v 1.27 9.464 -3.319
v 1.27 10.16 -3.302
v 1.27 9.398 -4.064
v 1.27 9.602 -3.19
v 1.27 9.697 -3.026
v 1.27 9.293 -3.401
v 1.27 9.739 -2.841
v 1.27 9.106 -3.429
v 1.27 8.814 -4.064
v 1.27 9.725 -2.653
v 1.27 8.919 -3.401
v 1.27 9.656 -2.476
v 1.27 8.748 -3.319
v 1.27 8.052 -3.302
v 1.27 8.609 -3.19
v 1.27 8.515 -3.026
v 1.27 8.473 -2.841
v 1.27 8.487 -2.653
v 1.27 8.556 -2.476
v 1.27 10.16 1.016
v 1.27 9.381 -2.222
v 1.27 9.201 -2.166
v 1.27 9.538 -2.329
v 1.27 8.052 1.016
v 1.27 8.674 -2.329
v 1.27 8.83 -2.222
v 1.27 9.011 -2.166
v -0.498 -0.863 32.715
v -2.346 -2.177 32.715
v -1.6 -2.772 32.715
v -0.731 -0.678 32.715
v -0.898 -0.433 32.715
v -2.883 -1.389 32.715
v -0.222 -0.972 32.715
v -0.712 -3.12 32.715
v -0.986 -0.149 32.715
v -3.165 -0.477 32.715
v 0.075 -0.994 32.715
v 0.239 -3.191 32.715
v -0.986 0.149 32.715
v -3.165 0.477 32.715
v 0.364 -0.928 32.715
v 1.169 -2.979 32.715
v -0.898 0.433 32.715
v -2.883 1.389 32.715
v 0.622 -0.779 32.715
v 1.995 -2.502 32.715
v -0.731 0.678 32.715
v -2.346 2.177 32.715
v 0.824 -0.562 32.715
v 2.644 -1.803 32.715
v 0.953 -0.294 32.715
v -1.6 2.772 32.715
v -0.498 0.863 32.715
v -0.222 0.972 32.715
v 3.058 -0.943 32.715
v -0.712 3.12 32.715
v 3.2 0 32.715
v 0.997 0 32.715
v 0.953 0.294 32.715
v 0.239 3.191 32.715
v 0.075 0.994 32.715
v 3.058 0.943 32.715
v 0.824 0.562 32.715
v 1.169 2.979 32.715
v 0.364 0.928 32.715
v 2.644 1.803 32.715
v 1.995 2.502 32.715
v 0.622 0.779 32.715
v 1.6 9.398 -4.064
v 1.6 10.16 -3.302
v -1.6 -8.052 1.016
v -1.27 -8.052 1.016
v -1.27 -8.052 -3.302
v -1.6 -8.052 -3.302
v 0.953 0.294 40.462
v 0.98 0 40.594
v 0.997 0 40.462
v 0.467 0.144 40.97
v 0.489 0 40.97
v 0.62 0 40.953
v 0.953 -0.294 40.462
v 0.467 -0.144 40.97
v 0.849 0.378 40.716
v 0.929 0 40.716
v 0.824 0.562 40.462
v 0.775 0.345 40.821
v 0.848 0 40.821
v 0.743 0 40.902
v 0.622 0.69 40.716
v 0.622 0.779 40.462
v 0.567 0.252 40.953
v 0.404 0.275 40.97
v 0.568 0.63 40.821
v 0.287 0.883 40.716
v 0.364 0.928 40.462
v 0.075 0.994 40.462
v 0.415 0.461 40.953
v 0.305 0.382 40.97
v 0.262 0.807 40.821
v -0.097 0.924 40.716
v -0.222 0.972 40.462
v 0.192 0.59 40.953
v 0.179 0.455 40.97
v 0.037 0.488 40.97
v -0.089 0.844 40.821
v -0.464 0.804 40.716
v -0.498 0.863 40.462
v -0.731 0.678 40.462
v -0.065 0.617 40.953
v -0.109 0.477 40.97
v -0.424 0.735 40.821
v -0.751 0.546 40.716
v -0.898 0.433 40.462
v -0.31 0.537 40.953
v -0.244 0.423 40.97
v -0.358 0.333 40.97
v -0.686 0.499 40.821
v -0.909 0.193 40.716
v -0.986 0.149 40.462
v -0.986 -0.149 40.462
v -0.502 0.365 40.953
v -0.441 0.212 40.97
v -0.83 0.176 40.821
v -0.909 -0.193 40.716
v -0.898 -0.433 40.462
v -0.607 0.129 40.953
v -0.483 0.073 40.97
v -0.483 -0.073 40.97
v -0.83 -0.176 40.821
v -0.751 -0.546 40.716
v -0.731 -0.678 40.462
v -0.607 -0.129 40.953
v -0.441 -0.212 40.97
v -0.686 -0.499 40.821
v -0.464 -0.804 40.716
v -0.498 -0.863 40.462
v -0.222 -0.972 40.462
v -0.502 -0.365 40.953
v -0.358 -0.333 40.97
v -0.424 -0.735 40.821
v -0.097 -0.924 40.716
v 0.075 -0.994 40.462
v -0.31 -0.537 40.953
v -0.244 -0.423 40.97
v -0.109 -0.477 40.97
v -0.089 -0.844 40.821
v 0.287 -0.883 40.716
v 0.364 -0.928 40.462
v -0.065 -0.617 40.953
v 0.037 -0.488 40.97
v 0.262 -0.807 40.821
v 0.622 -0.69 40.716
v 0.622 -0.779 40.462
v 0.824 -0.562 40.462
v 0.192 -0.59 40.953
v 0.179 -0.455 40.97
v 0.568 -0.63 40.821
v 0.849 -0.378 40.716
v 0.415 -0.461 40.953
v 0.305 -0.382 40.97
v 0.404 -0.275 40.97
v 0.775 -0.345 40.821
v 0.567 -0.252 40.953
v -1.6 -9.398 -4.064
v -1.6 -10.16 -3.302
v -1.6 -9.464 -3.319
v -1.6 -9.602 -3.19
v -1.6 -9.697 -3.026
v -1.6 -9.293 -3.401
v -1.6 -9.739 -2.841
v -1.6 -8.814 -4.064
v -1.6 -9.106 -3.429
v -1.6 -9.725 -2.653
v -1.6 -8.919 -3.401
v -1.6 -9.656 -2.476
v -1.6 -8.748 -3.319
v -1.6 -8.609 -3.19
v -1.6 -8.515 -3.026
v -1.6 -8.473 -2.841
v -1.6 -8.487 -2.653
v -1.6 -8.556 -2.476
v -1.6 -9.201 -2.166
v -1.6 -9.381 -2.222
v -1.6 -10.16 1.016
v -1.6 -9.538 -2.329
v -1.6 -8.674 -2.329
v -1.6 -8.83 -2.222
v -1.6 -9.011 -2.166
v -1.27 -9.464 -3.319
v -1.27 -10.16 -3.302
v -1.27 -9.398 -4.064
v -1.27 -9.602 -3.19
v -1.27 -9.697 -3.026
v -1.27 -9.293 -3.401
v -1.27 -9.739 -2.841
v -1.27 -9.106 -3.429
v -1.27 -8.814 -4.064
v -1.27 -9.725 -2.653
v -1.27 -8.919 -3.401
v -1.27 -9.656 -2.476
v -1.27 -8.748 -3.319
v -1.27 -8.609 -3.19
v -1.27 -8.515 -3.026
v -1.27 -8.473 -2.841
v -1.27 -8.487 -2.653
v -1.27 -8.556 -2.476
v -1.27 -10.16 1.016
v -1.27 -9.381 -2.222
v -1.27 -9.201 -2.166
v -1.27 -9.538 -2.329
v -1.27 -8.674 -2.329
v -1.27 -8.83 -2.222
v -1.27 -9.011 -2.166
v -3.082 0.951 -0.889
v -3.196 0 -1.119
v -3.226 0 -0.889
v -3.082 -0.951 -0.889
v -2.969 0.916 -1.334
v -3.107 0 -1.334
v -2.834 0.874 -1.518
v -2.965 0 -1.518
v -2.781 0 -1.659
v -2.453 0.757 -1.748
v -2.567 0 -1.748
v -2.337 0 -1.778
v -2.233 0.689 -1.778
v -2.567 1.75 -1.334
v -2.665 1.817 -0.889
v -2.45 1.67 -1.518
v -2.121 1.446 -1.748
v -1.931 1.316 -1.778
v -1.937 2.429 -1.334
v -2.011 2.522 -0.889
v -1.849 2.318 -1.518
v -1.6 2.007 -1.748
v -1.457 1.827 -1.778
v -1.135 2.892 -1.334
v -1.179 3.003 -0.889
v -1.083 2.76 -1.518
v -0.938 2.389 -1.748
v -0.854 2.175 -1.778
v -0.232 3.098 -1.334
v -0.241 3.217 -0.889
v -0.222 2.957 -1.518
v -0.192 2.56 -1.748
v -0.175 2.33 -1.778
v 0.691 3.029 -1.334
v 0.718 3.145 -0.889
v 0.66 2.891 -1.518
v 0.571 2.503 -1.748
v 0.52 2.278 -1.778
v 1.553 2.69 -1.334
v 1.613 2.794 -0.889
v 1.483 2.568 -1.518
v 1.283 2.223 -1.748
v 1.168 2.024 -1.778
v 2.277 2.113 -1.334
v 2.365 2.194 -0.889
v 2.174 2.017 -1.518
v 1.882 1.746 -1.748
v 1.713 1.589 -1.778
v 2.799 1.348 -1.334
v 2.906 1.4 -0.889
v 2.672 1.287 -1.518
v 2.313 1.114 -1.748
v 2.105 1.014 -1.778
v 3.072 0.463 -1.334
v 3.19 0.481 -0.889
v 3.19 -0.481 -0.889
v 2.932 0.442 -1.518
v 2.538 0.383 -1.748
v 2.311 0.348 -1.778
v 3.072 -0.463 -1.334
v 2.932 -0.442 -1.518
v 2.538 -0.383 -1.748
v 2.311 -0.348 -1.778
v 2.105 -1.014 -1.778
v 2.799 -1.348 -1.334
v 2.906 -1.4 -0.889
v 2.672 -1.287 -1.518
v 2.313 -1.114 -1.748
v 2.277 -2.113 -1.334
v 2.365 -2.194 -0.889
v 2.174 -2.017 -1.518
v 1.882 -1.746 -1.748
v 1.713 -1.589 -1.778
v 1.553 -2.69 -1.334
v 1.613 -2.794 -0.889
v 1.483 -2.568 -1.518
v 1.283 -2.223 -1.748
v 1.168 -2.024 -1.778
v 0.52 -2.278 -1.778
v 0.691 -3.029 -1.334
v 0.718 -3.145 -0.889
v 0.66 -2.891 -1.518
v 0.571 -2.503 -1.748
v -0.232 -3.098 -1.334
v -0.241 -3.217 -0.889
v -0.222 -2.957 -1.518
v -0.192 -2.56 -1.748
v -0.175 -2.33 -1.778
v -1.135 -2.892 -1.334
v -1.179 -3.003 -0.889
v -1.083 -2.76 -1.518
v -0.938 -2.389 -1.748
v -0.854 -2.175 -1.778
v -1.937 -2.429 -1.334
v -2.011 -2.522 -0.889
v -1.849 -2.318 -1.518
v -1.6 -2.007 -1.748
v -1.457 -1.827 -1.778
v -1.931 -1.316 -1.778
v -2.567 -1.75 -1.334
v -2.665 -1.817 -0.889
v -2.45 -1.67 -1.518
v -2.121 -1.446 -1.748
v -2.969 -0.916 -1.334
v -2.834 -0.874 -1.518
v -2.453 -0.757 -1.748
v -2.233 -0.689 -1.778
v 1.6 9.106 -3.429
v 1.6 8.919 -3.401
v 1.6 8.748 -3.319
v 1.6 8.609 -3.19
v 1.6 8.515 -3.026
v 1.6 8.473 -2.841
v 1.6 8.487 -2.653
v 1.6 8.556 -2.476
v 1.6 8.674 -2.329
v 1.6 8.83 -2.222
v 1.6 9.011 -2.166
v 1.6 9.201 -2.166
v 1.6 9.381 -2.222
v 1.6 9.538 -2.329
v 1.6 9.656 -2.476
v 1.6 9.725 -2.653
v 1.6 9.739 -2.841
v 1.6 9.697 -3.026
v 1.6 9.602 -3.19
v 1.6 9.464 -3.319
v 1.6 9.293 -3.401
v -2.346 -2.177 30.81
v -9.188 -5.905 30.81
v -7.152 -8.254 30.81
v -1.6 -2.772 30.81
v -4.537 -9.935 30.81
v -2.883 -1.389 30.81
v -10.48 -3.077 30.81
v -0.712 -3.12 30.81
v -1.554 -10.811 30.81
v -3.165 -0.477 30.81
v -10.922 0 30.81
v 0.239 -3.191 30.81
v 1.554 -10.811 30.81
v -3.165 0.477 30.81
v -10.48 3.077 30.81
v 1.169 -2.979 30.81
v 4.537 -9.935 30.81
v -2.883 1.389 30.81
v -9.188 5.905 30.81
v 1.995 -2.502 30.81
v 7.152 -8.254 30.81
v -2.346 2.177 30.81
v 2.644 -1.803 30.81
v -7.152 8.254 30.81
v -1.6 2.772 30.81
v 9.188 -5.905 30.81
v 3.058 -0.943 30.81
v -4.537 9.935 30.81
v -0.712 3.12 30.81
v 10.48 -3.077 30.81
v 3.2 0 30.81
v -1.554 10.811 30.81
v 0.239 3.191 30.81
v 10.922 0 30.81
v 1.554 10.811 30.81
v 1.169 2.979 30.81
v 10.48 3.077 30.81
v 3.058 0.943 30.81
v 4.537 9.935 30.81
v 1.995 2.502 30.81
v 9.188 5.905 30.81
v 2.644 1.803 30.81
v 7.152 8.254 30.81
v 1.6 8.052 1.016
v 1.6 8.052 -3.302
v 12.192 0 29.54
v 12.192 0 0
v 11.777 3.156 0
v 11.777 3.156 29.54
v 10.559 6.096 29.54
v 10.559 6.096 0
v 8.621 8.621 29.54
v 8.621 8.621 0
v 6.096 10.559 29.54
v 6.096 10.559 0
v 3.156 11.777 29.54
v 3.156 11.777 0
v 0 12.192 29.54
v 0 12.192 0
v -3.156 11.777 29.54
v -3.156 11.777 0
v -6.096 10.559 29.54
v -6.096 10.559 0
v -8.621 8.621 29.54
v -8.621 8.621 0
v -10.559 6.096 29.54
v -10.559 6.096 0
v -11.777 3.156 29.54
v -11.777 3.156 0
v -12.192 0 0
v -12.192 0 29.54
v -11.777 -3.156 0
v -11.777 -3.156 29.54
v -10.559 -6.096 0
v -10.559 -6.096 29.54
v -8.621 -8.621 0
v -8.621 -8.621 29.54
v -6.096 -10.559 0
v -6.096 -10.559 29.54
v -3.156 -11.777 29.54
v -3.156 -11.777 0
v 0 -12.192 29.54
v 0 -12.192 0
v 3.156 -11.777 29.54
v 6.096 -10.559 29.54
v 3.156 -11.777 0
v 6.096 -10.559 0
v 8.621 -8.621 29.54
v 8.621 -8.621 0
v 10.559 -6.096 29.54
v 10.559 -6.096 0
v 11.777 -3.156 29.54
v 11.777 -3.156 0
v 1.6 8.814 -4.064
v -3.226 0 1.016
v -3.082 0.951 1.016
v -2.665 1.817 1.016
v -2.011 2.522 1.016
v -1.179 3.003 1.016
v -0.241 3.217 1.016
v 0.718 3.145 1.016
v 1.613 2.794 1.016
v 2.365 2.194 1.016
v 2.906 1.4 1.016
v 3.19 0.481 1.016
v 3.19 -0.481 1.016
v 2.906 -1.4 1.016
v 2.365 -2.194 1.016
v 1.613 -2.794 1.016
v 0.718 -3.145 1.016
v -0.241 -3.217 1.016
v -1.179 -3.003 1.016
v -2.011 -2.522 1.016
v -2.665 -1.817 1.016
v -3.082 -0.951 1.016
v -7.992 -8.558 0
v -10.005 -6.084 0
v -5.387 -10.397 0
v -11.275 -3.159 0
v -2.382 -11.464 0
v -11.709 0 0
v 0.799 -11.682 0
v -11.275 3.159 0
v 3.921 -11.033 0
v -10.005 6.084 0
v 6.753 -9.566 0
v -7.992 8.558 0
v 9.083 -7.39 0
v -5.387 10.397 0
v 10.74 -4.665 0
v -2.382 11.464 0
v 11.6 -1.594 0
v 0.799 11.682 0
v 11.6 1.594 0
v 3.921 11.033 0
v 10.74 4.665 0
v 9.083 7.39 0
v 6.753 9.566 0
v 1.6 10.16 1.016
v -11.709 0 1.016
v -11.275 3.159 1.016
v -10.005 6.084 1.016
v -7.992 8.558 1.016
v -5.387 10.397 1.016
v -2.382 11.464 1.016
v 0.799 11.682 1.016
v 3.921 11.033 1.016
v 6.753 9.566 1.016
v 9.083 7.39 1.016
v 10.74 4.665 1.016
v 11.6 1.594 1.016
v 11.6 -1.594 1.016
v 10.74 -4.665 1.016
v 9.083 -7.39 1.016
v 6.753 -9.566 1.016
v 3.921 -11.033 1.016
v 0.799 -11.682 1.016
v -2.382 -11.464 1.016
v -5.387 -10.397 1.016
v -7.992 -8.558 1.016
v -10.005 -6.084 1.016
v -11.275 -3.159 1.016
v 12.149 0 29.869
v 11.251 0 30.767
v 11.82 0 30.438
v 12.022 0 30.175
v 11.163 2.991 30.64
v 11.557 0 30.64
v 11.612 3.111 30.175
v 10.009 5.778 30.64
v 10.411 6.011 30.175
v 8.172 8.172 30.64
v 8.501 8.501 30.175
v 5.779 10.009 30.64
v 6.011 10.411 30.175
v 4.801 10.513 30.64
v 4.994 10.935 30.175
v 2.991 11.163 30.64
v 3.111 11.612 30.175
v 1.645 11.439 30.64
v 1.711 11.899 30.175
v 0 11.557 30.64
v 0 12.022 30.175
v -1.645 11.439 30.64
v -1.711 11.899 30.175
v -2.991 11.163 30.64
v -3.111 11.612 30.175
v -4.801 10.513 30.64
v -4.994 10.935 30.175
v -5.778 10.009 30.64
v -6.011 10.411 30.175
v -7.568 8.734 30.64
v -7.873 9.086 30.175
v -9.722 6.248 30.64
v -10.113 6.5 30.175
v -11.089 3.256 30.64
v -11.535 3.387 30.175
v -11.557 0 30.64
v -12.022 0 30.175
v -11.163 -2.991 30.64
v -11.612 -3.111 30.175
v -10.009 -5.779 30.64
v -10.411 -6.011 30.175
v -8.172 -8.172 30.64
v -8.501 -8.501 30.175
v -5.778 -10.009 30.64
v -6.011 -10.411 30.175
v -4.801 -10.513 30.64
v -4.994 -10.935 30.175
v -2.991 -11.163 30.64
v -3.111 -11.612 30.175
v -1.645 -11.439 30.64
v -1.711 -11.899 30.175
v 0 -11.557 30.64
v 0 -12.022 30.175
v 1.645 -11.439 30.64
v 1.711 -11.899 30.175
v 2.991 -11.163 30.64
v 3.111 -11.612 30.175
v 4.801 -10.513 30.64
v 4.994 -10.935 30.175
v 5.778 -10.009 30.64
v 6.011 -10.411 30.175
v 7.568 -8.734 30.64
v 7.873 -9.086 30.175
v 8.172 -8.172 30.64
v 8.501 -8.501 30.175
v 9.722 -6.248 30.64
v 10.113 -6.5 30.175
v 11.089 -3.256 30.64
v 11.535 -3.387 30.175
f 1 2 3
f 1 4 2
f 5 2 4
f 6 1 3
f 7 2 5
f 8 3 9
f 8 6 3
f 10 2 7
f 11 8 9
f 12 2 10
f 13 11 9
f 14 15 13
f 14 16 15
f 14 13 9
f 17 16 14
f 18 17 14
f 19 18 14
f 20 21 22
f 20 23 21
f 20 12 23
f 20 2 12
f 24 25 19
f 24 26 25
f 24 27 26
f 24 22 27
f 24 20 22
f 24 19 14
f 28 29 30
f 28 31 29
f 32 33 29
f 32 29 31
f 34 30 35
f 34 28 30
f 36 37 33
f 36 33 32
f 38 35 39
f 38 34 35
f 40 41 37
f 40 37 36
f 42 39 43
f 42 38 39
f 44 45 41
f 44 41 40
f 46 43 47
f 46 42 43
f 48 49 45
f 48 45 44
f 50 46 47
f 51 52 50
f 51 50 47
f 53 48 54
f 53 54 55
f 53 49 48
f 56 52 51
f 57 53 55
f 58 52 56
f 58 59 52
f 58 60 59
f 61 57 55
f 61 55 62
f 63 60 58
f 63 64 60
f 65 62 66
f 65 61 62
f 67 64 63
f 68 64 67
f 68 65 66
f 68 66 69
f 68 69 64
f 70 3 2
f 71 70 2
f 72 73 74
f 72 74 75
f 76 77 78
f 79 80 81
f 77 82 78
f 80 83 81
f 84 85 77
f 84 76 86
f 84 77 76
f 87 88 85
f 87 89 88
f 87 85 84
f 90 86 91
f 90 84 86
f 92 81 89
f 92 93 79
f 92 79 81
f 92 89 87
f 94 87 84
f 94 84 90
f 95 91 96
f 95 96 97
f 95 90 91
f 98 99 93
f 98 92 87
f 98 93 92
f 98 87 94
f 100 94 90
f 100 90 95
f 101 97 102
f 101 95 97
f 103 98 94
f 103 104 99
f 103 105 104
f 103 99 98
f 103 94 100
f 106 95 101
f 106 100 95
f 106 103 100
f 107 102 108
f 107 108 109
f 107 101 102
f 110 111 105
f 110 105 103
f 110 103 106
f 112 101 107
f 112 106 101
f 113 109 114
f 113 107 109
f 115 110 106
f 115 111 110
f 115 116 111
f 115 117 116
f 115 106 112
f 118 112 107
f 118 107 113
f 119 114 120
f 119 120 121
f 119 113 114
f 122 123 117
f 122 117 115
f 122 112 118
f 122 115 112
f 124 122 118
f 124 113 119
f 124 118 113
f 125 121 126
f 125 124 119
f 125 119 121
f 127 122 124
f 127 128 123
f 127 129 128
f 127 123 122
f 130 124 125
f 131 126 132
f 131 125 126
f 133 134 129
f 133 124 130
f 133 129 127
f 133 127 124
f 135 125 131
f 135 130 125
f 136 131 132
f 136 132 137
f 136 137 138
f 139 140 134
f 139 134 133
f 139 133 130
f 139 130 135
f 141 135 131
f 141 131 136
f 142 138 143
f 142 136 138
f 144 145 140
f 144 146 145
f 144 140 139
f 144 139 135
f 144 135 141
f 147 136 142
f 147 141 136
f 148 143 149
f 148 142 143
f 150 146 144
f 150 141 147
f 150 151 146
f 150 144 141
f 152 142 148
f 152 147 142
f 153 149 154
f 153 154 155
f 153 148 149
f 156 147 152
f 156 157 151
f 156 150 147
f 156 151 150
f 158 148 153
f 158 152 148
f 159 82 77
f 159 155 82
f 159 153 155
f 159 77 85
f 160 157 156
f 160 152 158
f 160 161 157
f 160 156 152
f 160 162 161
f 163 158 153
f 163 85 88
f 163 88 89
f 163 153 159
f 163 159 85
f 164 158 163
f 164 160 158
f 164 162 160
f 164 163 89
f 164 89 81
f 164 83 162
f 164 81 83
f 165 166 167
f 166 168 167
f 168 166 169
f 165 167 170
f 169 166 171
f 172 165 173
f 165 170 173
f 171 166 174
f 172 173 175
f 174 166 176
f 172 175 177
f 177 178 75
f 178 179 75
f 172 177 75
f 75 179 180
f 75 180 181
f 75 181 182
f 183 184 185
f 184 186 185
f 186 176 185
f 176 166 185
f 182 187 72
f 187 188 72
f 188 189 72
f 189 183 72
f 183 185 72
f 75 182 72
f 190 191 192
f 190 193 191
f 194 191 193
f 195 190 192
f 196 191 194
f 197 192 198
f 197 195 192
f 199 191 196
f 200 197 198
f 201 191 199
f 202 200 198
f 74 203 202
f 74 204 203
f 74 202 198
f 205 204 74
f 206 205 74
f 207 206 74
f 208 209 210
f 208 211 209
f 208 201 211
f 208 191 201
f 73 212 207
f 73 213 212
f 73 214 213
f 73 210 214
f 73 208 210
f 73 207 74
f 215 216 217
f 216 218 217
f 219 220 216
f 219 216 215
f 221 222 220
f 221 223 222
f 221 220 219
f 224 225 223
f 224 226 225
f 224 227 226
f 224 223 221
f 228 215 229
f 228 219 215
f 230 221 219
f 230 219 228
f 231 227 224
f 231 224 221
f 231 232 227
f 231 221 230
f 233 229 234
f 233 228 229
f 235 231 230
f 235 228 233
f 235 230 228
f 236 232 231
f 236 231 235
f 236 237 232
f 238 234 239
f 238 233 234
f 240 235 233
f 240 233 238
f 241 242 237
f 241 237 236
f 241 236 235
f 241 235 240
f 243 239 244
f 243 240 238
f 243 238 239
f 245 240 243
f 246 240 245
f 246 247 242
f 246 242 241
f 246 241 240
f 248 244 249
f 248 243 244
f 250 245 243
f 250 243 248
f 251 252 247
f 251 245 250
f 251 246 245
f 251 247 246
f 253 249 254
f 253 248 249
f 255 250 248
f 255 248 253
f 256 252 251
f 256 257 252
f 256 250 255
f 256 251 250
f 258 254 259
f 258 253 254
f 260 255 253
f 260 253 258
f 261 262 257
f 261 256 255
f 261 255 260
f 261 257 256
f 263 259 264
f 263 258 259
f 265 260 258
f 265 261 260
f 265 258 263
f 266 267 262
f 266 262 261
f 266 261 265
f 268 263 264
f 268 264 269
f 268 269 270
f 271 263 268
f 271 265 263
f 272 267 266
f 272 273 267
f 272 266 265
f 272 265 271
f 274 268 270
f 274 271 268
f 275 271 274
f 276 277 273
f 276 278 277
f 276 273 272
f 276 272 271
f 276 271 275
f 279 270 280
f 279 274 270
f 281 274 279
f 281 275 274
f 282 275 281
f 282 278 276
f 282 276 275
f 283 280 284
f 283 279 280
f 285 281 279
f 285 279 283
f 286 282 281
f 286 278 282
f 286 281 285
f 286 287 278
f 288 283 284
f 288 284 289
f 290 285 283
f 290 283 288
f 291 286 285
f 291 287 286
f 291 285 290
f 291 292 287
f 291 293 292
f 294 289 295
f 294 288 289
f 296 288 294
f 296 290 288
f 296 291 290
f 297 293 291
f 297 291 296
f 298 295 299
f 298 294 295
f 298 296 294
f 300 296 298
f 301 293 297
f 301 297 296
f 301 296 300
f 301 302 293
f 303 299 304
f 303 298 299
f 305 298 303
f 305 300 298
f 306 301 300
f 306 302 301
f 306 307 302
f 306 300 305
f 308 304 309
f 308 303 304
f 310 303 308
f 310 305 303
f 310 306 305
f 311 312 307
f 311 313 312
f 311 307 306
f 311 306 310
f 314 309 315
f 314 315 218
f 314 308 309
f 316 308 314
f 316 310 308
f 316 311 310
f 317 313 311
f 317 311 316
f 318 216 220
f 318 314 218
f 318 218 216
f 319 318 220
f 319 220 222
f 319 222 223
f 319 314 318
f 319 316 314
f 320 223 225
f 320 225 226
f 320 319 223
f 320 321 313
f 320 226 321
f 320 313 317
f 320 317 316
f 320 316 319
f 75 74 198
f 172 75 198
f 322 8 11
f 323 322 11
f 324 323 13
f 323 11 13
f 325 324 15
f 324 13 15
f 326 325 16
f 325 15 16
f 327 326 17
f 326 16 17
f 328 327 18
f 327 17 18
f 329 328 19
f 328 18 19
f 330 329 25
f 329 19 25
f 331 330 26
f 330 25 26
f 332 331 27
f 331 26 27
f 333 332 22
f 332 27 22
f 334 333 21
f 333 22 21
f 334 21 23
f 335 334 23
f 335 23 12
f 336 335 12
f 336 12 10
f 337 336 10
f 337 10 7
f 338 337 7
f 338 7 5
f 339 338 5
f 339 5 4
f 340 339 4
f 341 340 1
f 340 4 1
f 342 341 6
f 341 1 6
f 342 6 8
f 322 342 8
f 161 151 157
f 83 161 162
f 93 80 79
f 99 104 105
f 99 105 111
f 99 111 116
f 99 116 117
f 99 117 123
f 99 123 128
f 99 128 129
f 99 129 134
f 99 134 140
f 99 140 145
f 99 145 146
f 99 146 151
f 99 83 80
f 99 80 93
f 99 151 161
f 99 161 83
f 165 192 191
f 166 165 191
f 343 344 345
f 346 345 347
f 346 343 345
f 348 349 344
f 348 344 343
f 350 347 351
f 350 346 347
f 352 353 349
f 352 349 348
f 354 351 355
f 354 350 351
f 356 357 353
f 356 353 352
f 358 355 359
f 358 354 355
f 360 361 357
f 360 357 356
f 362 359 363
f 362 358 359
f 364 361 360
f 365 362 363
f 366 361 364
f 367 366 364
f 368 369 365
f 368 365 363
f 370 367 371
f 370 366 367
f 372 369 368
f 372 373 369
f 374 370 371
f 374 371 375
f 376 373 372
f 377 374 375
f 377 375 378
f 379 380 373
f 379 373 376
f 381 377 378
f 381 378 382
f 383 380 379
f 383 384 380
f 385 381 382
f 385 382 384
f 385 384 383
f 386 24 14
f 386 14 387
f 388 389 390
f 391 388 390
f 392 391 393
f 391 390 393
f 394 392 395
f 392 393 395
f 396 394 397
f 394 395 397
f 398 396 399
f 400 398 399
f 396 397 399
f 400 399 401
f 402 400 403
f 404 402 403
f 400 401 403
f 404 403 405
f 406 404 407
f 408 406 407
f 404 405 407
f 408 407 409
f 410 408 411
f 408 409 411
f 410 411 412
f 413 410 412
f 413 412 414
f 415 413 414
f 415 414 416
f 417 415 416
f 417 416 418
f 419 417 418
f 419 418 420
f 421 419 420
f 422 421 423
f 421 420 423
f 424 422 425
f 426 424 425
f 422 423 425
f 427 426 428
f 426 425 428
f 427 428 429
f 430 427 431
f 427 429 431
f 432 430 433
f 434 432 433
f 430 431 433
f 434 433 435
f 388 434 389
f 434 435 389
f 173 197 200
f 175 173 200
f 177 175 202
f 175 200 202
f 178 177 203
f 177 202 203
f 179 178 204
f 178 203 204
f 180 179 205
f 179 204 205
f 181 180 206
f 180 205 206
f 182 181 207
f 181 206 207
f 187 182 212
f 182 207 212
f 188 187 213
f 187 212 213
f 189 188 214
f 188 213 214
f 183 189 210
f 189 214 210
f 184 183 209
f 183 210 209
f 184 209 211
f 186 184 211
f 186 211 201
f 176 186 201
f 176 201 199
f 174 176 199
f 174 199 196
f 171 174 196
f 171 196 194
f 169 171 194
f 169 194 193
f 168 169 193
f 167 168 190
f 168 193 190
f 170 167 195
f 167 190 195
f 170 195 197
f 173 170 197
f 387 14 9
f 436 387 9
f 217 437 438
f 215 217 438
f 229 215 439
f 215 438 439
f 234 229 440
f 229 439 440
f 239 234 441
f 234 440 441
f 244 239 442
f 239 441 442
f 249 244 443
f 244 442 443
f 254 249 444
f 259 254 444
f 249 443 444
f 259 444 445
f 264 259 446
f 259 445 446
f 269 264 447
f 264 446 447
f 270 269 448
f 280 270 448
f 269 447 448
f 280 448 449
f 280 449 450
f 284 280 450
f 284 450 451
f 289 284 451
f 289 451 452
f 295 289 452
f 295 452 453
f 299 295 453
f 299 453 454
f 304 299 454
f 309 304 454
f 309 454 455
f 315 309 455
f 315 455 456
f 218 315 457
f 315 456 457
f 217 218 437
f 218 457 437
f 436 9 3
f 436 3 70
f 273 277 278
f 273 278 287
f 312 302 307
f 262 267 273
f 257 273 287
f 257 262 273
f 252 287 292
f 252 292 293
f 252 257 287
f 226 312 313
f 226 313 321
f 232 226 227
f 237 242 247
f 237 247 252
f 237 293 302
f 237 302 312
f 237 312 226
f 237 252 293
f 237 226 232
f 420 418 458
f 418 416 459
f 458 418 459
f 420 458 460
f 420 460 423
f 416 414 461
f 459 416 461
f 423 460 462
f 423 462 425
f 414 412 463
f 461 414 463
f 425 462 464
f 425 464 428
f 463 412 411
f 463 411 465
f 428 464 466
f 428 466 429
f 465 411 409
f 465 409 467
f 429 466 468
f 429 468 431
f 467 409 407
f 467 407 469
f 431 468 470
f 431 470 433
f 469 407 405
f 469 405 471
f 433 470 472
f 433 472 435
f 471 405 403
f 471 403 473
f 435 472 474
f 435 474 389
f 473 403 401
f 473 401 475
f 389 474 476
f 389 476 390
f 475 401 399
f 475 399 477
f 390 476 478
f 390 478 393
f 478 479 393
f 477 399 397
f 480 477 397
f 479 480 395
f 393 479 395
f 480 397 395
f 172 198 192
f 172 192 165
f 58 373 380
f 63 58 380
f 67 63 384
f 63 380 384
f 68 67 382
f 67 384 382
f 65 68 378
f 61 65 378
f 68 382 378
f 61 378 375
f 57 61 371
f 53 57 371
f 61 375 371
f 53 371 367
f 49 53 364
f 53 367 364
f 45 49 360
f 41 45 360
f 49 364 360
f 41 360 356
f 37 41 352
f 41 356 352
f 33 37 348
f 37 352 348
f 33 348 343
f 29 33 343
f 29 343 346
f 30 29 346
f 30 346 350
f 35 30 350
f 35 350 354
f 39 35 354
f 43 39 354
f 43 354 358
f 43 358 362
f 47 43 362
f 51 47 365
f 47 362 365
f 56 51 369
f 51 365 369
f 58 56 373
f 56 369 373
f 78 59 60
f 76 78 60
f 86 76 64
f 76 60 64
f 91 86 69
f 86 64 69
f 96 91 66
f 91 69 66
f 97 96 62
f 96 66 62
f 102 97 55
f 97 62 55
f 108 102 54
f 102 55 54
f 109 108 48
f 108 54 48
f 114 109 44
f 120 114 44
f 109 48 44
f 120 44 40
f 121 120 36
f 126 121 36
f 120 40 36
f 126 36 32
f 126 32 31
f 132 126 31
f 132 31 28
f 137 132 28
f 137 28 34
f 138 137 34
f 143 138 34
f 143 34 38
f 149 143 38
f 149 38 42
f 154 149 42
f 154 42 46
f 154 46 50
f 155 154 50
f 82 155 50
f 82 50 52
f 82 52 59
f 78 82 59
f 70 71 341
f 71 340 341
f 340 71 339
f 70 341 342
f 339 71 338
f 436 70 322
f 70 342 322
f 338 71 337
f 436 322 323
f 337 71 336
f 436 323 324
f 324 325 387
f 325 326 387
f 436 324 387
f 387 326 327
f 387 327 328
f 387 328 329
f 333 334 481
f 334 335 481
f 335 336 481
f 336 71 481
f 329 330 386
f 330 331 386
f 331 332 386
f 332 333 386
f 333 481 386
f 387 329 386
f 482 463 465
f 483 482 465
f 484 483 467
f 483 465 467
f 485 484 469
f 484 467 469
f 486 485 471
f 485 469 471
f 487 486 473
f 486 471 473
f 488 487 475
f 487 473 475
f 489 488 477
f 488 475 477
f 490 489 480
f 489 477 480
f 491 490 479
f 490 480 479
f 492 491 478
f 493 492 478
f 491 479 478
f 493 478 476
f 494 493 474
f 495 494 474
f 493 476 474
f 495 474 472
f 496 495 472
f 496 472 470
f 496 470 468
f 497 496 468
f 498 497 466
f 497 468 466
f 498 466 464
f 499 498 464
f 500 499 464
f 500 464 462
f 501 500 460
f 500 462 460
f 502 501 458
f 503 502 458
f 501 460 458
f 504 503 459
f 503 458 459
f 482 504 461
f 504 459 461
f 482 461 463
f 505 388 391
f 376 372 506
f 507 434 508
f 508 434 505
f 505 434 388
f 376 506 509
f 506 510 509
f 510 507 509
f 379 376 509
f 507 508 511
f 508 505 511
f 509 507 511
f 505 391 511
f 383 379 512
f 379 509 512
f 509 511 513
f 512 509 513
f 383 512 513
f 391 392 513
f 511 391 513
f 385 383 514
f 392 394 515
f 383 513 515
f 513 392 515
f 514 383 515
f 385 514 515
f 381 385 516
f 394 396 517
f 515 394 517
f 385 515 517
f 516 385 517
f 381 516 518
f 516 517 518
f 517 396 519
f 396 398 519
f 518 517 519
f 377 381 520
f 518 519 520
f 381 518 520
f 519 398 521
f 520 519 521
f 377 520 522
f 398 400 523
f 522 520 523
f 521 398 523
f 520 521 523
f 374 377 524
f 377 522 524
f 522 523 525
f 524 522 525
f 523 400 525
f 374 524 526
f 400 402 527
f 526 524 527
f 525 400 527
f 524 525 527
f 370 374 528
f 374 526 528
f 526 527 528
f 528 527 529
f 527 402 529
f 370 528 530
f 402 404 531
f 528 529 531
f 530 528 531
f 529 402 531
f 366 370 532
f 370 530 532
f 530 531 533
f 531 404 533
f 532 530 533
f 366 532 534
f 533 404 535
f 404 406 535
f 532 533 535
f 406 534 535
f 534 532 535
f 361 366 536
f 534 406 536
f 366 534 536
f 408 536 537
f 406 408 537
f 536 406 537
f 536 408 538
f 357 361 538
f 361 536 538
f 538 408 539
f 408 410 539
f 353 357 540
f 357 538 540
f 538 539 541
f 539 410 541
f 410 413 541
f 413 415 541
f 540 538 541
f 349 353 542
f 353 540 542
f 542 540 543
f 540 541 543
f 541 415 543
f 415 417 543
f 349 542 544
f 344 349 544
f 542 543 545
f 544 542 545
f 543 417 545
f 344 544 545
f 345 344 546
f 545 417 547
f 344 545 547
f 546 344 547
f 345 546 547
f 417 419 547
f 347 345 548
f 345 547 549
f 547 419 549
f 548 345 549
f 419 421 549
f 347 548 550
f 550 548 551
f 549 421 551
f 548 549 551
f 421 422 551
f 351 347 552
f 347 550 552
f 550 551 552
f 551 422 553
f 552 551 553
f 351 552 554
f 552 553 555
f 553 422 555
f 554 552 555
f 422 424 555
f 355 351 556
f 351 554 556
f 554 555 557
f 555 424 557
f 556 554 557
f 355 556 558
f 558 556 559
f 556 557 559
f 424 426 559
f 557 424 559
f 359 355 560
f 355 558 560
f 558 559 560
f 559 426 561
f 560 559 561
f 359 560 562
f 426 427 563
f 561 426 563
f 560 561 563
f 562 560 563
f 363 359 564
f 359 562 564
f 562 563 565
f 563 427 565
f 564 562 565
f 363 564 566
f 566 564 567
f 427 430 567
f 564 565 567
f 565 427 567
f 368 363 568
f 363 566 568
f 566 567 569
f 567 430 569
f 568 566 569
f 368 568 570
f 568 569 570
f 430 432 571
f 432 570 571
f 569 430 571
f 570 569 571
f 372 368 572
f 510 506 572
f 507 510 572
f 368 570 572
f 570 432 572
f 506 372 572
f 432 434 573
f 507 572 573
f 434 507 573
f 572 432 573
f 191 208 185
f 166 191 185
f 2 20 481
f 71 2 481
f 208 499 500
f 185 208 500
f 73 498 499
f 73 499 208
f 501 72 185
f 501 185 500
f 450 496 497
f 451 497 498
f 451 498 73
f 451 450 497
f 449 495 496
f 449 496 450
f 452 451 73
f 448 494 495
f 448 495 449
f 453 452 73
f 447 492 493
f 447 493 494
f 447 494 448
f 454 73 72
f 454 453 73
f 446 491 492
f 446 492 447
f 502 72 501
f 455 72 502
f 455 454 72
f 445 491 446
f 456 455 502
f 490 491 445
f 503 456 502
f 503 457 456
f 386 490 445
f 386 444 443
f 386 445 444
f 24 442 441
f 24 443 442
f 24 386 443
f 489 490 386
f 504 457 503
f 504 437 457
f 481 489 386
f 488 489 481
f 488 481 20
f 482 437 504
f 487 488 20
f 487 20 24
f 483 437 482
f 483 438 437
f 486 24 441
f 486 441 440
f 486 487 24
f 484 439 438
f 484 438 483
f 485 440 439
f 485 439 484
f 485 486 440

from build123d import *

# Parameters (mm, degrees)
SKETCH1_R           = 12.192
BOSS_EXTRUDE1_DEPTH = 30.8102
SKETCH2_R           = 0.99695
BOSS_EXTRUDE3_DEPTH = 10.16
SKETCH6_R           = 3.2004
BOSS_EXTRUDE4_DEPTH = 1.905
FILLET2_R           = 0.508
FILLET3_R           = 1.27
SKETCH7_R           = 11.7094
CUT_EXTRUDE1_DEPTH  = 1.016
SKETCH10_R          = 3.2258
BOSS_EXTRUDE5_DEPTH = 2.794
FILLET4_R           = 0.889
SKETCH11_W          = 0.3302
SKETCH11_H          = 2.1082
BOSS_EXTRUDE6_DEPTH = 5.08
SKETCH12_R          = 0.635
CUT_EXTRUDE2_DEPTH  = 0.3302
CIRPATTERN1_COUNT   = 2


with BuildPart() as part:
    # Sketch1 → Boss-Extrude1 (new body)
    with BuildSketch(Plane.XY):
        Circle(SKETCH1_R)
    extrude(amount=BOSS_EXTRUDE1_DEPTH)

    # Sketch2 → Boss-Extrude3 (add)
    with BuildSketch(Plane.XY.offset(30.8102)):
        Circle(SKETCH2_R)
    extrude(amount=BOSS_EXTRUDE3_DEPTH)

    # Sketch6 → Boss-Extrude4 (add)
    with BuildSketch(Plane.XY.offset(30.8102)):
        Circle(SKETCH6_R)
    extrude(amount=BOSS_EXTRUDE4_DEPTH)

    # Fillet2
    fillet2_edges = [part.edges().sort_by_distance(p)[0] for p in [
        (-0.99695, 0, 40.9702),
    ]]
    fillet(fillet2_edges, radius=FILLET2_R)

    # Fillet3
    fillet3_edges = [part.edges().sort_by_distance(p)[0] for p in [
        (-12.192, 0, 30.8102),
    ]]
    fillet(fillet3_edges, radius=FILLET3_R)

    # Sketch7 → Cut-Extrude1 (cut)
    with BuildSketch(Plane(origin=(0, 0, 0), x_dir=(-1, 0, 0), z_dir=(0, 0, -1))):
        Circle(SKETCH7_R)
    extrude(amount=-CUT_EXTRUDE1_DEPTH, mode=Mode.SUBTRACT)

    # Sketch10 → Boss-Extrude5 (add)
    with BuildSketch(Plane(origin=(0, 0, 1.016), x_dir=(-1, 0, 0), z_dir=(0, 0, -1))):
        Circle(SKETCH10_R)
    extrude(amount=BOSS_EXTRUDE5_DEPTH)

    # Fillet4
    fillet4_edges = [part.edges().sort_by_distance(p)[0] for p in [
        (3.2258, 0, -1.778),
    ]]
    fillet(fillet4_edges, radius=FILLET4_R)

    # Sketch11 → Boss-Extrude6 (add)
    with BuildSketch(Plane(origin=(0, 0, 1.016), x_dir=(-1, 0, 0), z_dir=(0, 0, -1))):
        with Locations((1.4351, -9.1059)):
            Rectangle(SKETCH11_W, SKETCH11_H)
    boss_extrude6 = extrude(amount=BOSS_EXTRUDE6_DEPTH)

    # Sketch12 → Cut-Extrude2 (cut)
    with BuildSketch(Plane(origin=(-1.27, 0, 0), x_dir=(0, 0, -1), z_dir=(1, 0, 0))):
        with Locations((2.794, -9.1059)):
            Circle(SKETCH12_R)
        Polygon((3.302, -8.0518), (4.064, -8.8138), (4.064, -8.0518), align=None)
        Polygon((4.064, -9.398), (3.302, -10.16), (4.064, -10.16), align=None)
    cut_extrude2 = extrude(amount=-CUT_EXTRUDE2_DEPTH, mode=Mode.SUBTRACT)

    # CirPattern1: Boss-Extrude6, Cut-Extrude2 ×2 about axis
    cirpattern1_axis = Axis((0, 0, 0), (0, 0, 1))
    for i in range(1, CIRPATTERN1_COUNT):
        add(boss_extrude6.rotate(cirpattern1_axis, i * 360 / CIRPATTERN1_COUNT))
        add(cut_extrude2.rotate(cirpattern1_axis, i * 360 / CIRPATTERN1_COUNT), mode=Mode.SUBTRACT)


solid = part.part
